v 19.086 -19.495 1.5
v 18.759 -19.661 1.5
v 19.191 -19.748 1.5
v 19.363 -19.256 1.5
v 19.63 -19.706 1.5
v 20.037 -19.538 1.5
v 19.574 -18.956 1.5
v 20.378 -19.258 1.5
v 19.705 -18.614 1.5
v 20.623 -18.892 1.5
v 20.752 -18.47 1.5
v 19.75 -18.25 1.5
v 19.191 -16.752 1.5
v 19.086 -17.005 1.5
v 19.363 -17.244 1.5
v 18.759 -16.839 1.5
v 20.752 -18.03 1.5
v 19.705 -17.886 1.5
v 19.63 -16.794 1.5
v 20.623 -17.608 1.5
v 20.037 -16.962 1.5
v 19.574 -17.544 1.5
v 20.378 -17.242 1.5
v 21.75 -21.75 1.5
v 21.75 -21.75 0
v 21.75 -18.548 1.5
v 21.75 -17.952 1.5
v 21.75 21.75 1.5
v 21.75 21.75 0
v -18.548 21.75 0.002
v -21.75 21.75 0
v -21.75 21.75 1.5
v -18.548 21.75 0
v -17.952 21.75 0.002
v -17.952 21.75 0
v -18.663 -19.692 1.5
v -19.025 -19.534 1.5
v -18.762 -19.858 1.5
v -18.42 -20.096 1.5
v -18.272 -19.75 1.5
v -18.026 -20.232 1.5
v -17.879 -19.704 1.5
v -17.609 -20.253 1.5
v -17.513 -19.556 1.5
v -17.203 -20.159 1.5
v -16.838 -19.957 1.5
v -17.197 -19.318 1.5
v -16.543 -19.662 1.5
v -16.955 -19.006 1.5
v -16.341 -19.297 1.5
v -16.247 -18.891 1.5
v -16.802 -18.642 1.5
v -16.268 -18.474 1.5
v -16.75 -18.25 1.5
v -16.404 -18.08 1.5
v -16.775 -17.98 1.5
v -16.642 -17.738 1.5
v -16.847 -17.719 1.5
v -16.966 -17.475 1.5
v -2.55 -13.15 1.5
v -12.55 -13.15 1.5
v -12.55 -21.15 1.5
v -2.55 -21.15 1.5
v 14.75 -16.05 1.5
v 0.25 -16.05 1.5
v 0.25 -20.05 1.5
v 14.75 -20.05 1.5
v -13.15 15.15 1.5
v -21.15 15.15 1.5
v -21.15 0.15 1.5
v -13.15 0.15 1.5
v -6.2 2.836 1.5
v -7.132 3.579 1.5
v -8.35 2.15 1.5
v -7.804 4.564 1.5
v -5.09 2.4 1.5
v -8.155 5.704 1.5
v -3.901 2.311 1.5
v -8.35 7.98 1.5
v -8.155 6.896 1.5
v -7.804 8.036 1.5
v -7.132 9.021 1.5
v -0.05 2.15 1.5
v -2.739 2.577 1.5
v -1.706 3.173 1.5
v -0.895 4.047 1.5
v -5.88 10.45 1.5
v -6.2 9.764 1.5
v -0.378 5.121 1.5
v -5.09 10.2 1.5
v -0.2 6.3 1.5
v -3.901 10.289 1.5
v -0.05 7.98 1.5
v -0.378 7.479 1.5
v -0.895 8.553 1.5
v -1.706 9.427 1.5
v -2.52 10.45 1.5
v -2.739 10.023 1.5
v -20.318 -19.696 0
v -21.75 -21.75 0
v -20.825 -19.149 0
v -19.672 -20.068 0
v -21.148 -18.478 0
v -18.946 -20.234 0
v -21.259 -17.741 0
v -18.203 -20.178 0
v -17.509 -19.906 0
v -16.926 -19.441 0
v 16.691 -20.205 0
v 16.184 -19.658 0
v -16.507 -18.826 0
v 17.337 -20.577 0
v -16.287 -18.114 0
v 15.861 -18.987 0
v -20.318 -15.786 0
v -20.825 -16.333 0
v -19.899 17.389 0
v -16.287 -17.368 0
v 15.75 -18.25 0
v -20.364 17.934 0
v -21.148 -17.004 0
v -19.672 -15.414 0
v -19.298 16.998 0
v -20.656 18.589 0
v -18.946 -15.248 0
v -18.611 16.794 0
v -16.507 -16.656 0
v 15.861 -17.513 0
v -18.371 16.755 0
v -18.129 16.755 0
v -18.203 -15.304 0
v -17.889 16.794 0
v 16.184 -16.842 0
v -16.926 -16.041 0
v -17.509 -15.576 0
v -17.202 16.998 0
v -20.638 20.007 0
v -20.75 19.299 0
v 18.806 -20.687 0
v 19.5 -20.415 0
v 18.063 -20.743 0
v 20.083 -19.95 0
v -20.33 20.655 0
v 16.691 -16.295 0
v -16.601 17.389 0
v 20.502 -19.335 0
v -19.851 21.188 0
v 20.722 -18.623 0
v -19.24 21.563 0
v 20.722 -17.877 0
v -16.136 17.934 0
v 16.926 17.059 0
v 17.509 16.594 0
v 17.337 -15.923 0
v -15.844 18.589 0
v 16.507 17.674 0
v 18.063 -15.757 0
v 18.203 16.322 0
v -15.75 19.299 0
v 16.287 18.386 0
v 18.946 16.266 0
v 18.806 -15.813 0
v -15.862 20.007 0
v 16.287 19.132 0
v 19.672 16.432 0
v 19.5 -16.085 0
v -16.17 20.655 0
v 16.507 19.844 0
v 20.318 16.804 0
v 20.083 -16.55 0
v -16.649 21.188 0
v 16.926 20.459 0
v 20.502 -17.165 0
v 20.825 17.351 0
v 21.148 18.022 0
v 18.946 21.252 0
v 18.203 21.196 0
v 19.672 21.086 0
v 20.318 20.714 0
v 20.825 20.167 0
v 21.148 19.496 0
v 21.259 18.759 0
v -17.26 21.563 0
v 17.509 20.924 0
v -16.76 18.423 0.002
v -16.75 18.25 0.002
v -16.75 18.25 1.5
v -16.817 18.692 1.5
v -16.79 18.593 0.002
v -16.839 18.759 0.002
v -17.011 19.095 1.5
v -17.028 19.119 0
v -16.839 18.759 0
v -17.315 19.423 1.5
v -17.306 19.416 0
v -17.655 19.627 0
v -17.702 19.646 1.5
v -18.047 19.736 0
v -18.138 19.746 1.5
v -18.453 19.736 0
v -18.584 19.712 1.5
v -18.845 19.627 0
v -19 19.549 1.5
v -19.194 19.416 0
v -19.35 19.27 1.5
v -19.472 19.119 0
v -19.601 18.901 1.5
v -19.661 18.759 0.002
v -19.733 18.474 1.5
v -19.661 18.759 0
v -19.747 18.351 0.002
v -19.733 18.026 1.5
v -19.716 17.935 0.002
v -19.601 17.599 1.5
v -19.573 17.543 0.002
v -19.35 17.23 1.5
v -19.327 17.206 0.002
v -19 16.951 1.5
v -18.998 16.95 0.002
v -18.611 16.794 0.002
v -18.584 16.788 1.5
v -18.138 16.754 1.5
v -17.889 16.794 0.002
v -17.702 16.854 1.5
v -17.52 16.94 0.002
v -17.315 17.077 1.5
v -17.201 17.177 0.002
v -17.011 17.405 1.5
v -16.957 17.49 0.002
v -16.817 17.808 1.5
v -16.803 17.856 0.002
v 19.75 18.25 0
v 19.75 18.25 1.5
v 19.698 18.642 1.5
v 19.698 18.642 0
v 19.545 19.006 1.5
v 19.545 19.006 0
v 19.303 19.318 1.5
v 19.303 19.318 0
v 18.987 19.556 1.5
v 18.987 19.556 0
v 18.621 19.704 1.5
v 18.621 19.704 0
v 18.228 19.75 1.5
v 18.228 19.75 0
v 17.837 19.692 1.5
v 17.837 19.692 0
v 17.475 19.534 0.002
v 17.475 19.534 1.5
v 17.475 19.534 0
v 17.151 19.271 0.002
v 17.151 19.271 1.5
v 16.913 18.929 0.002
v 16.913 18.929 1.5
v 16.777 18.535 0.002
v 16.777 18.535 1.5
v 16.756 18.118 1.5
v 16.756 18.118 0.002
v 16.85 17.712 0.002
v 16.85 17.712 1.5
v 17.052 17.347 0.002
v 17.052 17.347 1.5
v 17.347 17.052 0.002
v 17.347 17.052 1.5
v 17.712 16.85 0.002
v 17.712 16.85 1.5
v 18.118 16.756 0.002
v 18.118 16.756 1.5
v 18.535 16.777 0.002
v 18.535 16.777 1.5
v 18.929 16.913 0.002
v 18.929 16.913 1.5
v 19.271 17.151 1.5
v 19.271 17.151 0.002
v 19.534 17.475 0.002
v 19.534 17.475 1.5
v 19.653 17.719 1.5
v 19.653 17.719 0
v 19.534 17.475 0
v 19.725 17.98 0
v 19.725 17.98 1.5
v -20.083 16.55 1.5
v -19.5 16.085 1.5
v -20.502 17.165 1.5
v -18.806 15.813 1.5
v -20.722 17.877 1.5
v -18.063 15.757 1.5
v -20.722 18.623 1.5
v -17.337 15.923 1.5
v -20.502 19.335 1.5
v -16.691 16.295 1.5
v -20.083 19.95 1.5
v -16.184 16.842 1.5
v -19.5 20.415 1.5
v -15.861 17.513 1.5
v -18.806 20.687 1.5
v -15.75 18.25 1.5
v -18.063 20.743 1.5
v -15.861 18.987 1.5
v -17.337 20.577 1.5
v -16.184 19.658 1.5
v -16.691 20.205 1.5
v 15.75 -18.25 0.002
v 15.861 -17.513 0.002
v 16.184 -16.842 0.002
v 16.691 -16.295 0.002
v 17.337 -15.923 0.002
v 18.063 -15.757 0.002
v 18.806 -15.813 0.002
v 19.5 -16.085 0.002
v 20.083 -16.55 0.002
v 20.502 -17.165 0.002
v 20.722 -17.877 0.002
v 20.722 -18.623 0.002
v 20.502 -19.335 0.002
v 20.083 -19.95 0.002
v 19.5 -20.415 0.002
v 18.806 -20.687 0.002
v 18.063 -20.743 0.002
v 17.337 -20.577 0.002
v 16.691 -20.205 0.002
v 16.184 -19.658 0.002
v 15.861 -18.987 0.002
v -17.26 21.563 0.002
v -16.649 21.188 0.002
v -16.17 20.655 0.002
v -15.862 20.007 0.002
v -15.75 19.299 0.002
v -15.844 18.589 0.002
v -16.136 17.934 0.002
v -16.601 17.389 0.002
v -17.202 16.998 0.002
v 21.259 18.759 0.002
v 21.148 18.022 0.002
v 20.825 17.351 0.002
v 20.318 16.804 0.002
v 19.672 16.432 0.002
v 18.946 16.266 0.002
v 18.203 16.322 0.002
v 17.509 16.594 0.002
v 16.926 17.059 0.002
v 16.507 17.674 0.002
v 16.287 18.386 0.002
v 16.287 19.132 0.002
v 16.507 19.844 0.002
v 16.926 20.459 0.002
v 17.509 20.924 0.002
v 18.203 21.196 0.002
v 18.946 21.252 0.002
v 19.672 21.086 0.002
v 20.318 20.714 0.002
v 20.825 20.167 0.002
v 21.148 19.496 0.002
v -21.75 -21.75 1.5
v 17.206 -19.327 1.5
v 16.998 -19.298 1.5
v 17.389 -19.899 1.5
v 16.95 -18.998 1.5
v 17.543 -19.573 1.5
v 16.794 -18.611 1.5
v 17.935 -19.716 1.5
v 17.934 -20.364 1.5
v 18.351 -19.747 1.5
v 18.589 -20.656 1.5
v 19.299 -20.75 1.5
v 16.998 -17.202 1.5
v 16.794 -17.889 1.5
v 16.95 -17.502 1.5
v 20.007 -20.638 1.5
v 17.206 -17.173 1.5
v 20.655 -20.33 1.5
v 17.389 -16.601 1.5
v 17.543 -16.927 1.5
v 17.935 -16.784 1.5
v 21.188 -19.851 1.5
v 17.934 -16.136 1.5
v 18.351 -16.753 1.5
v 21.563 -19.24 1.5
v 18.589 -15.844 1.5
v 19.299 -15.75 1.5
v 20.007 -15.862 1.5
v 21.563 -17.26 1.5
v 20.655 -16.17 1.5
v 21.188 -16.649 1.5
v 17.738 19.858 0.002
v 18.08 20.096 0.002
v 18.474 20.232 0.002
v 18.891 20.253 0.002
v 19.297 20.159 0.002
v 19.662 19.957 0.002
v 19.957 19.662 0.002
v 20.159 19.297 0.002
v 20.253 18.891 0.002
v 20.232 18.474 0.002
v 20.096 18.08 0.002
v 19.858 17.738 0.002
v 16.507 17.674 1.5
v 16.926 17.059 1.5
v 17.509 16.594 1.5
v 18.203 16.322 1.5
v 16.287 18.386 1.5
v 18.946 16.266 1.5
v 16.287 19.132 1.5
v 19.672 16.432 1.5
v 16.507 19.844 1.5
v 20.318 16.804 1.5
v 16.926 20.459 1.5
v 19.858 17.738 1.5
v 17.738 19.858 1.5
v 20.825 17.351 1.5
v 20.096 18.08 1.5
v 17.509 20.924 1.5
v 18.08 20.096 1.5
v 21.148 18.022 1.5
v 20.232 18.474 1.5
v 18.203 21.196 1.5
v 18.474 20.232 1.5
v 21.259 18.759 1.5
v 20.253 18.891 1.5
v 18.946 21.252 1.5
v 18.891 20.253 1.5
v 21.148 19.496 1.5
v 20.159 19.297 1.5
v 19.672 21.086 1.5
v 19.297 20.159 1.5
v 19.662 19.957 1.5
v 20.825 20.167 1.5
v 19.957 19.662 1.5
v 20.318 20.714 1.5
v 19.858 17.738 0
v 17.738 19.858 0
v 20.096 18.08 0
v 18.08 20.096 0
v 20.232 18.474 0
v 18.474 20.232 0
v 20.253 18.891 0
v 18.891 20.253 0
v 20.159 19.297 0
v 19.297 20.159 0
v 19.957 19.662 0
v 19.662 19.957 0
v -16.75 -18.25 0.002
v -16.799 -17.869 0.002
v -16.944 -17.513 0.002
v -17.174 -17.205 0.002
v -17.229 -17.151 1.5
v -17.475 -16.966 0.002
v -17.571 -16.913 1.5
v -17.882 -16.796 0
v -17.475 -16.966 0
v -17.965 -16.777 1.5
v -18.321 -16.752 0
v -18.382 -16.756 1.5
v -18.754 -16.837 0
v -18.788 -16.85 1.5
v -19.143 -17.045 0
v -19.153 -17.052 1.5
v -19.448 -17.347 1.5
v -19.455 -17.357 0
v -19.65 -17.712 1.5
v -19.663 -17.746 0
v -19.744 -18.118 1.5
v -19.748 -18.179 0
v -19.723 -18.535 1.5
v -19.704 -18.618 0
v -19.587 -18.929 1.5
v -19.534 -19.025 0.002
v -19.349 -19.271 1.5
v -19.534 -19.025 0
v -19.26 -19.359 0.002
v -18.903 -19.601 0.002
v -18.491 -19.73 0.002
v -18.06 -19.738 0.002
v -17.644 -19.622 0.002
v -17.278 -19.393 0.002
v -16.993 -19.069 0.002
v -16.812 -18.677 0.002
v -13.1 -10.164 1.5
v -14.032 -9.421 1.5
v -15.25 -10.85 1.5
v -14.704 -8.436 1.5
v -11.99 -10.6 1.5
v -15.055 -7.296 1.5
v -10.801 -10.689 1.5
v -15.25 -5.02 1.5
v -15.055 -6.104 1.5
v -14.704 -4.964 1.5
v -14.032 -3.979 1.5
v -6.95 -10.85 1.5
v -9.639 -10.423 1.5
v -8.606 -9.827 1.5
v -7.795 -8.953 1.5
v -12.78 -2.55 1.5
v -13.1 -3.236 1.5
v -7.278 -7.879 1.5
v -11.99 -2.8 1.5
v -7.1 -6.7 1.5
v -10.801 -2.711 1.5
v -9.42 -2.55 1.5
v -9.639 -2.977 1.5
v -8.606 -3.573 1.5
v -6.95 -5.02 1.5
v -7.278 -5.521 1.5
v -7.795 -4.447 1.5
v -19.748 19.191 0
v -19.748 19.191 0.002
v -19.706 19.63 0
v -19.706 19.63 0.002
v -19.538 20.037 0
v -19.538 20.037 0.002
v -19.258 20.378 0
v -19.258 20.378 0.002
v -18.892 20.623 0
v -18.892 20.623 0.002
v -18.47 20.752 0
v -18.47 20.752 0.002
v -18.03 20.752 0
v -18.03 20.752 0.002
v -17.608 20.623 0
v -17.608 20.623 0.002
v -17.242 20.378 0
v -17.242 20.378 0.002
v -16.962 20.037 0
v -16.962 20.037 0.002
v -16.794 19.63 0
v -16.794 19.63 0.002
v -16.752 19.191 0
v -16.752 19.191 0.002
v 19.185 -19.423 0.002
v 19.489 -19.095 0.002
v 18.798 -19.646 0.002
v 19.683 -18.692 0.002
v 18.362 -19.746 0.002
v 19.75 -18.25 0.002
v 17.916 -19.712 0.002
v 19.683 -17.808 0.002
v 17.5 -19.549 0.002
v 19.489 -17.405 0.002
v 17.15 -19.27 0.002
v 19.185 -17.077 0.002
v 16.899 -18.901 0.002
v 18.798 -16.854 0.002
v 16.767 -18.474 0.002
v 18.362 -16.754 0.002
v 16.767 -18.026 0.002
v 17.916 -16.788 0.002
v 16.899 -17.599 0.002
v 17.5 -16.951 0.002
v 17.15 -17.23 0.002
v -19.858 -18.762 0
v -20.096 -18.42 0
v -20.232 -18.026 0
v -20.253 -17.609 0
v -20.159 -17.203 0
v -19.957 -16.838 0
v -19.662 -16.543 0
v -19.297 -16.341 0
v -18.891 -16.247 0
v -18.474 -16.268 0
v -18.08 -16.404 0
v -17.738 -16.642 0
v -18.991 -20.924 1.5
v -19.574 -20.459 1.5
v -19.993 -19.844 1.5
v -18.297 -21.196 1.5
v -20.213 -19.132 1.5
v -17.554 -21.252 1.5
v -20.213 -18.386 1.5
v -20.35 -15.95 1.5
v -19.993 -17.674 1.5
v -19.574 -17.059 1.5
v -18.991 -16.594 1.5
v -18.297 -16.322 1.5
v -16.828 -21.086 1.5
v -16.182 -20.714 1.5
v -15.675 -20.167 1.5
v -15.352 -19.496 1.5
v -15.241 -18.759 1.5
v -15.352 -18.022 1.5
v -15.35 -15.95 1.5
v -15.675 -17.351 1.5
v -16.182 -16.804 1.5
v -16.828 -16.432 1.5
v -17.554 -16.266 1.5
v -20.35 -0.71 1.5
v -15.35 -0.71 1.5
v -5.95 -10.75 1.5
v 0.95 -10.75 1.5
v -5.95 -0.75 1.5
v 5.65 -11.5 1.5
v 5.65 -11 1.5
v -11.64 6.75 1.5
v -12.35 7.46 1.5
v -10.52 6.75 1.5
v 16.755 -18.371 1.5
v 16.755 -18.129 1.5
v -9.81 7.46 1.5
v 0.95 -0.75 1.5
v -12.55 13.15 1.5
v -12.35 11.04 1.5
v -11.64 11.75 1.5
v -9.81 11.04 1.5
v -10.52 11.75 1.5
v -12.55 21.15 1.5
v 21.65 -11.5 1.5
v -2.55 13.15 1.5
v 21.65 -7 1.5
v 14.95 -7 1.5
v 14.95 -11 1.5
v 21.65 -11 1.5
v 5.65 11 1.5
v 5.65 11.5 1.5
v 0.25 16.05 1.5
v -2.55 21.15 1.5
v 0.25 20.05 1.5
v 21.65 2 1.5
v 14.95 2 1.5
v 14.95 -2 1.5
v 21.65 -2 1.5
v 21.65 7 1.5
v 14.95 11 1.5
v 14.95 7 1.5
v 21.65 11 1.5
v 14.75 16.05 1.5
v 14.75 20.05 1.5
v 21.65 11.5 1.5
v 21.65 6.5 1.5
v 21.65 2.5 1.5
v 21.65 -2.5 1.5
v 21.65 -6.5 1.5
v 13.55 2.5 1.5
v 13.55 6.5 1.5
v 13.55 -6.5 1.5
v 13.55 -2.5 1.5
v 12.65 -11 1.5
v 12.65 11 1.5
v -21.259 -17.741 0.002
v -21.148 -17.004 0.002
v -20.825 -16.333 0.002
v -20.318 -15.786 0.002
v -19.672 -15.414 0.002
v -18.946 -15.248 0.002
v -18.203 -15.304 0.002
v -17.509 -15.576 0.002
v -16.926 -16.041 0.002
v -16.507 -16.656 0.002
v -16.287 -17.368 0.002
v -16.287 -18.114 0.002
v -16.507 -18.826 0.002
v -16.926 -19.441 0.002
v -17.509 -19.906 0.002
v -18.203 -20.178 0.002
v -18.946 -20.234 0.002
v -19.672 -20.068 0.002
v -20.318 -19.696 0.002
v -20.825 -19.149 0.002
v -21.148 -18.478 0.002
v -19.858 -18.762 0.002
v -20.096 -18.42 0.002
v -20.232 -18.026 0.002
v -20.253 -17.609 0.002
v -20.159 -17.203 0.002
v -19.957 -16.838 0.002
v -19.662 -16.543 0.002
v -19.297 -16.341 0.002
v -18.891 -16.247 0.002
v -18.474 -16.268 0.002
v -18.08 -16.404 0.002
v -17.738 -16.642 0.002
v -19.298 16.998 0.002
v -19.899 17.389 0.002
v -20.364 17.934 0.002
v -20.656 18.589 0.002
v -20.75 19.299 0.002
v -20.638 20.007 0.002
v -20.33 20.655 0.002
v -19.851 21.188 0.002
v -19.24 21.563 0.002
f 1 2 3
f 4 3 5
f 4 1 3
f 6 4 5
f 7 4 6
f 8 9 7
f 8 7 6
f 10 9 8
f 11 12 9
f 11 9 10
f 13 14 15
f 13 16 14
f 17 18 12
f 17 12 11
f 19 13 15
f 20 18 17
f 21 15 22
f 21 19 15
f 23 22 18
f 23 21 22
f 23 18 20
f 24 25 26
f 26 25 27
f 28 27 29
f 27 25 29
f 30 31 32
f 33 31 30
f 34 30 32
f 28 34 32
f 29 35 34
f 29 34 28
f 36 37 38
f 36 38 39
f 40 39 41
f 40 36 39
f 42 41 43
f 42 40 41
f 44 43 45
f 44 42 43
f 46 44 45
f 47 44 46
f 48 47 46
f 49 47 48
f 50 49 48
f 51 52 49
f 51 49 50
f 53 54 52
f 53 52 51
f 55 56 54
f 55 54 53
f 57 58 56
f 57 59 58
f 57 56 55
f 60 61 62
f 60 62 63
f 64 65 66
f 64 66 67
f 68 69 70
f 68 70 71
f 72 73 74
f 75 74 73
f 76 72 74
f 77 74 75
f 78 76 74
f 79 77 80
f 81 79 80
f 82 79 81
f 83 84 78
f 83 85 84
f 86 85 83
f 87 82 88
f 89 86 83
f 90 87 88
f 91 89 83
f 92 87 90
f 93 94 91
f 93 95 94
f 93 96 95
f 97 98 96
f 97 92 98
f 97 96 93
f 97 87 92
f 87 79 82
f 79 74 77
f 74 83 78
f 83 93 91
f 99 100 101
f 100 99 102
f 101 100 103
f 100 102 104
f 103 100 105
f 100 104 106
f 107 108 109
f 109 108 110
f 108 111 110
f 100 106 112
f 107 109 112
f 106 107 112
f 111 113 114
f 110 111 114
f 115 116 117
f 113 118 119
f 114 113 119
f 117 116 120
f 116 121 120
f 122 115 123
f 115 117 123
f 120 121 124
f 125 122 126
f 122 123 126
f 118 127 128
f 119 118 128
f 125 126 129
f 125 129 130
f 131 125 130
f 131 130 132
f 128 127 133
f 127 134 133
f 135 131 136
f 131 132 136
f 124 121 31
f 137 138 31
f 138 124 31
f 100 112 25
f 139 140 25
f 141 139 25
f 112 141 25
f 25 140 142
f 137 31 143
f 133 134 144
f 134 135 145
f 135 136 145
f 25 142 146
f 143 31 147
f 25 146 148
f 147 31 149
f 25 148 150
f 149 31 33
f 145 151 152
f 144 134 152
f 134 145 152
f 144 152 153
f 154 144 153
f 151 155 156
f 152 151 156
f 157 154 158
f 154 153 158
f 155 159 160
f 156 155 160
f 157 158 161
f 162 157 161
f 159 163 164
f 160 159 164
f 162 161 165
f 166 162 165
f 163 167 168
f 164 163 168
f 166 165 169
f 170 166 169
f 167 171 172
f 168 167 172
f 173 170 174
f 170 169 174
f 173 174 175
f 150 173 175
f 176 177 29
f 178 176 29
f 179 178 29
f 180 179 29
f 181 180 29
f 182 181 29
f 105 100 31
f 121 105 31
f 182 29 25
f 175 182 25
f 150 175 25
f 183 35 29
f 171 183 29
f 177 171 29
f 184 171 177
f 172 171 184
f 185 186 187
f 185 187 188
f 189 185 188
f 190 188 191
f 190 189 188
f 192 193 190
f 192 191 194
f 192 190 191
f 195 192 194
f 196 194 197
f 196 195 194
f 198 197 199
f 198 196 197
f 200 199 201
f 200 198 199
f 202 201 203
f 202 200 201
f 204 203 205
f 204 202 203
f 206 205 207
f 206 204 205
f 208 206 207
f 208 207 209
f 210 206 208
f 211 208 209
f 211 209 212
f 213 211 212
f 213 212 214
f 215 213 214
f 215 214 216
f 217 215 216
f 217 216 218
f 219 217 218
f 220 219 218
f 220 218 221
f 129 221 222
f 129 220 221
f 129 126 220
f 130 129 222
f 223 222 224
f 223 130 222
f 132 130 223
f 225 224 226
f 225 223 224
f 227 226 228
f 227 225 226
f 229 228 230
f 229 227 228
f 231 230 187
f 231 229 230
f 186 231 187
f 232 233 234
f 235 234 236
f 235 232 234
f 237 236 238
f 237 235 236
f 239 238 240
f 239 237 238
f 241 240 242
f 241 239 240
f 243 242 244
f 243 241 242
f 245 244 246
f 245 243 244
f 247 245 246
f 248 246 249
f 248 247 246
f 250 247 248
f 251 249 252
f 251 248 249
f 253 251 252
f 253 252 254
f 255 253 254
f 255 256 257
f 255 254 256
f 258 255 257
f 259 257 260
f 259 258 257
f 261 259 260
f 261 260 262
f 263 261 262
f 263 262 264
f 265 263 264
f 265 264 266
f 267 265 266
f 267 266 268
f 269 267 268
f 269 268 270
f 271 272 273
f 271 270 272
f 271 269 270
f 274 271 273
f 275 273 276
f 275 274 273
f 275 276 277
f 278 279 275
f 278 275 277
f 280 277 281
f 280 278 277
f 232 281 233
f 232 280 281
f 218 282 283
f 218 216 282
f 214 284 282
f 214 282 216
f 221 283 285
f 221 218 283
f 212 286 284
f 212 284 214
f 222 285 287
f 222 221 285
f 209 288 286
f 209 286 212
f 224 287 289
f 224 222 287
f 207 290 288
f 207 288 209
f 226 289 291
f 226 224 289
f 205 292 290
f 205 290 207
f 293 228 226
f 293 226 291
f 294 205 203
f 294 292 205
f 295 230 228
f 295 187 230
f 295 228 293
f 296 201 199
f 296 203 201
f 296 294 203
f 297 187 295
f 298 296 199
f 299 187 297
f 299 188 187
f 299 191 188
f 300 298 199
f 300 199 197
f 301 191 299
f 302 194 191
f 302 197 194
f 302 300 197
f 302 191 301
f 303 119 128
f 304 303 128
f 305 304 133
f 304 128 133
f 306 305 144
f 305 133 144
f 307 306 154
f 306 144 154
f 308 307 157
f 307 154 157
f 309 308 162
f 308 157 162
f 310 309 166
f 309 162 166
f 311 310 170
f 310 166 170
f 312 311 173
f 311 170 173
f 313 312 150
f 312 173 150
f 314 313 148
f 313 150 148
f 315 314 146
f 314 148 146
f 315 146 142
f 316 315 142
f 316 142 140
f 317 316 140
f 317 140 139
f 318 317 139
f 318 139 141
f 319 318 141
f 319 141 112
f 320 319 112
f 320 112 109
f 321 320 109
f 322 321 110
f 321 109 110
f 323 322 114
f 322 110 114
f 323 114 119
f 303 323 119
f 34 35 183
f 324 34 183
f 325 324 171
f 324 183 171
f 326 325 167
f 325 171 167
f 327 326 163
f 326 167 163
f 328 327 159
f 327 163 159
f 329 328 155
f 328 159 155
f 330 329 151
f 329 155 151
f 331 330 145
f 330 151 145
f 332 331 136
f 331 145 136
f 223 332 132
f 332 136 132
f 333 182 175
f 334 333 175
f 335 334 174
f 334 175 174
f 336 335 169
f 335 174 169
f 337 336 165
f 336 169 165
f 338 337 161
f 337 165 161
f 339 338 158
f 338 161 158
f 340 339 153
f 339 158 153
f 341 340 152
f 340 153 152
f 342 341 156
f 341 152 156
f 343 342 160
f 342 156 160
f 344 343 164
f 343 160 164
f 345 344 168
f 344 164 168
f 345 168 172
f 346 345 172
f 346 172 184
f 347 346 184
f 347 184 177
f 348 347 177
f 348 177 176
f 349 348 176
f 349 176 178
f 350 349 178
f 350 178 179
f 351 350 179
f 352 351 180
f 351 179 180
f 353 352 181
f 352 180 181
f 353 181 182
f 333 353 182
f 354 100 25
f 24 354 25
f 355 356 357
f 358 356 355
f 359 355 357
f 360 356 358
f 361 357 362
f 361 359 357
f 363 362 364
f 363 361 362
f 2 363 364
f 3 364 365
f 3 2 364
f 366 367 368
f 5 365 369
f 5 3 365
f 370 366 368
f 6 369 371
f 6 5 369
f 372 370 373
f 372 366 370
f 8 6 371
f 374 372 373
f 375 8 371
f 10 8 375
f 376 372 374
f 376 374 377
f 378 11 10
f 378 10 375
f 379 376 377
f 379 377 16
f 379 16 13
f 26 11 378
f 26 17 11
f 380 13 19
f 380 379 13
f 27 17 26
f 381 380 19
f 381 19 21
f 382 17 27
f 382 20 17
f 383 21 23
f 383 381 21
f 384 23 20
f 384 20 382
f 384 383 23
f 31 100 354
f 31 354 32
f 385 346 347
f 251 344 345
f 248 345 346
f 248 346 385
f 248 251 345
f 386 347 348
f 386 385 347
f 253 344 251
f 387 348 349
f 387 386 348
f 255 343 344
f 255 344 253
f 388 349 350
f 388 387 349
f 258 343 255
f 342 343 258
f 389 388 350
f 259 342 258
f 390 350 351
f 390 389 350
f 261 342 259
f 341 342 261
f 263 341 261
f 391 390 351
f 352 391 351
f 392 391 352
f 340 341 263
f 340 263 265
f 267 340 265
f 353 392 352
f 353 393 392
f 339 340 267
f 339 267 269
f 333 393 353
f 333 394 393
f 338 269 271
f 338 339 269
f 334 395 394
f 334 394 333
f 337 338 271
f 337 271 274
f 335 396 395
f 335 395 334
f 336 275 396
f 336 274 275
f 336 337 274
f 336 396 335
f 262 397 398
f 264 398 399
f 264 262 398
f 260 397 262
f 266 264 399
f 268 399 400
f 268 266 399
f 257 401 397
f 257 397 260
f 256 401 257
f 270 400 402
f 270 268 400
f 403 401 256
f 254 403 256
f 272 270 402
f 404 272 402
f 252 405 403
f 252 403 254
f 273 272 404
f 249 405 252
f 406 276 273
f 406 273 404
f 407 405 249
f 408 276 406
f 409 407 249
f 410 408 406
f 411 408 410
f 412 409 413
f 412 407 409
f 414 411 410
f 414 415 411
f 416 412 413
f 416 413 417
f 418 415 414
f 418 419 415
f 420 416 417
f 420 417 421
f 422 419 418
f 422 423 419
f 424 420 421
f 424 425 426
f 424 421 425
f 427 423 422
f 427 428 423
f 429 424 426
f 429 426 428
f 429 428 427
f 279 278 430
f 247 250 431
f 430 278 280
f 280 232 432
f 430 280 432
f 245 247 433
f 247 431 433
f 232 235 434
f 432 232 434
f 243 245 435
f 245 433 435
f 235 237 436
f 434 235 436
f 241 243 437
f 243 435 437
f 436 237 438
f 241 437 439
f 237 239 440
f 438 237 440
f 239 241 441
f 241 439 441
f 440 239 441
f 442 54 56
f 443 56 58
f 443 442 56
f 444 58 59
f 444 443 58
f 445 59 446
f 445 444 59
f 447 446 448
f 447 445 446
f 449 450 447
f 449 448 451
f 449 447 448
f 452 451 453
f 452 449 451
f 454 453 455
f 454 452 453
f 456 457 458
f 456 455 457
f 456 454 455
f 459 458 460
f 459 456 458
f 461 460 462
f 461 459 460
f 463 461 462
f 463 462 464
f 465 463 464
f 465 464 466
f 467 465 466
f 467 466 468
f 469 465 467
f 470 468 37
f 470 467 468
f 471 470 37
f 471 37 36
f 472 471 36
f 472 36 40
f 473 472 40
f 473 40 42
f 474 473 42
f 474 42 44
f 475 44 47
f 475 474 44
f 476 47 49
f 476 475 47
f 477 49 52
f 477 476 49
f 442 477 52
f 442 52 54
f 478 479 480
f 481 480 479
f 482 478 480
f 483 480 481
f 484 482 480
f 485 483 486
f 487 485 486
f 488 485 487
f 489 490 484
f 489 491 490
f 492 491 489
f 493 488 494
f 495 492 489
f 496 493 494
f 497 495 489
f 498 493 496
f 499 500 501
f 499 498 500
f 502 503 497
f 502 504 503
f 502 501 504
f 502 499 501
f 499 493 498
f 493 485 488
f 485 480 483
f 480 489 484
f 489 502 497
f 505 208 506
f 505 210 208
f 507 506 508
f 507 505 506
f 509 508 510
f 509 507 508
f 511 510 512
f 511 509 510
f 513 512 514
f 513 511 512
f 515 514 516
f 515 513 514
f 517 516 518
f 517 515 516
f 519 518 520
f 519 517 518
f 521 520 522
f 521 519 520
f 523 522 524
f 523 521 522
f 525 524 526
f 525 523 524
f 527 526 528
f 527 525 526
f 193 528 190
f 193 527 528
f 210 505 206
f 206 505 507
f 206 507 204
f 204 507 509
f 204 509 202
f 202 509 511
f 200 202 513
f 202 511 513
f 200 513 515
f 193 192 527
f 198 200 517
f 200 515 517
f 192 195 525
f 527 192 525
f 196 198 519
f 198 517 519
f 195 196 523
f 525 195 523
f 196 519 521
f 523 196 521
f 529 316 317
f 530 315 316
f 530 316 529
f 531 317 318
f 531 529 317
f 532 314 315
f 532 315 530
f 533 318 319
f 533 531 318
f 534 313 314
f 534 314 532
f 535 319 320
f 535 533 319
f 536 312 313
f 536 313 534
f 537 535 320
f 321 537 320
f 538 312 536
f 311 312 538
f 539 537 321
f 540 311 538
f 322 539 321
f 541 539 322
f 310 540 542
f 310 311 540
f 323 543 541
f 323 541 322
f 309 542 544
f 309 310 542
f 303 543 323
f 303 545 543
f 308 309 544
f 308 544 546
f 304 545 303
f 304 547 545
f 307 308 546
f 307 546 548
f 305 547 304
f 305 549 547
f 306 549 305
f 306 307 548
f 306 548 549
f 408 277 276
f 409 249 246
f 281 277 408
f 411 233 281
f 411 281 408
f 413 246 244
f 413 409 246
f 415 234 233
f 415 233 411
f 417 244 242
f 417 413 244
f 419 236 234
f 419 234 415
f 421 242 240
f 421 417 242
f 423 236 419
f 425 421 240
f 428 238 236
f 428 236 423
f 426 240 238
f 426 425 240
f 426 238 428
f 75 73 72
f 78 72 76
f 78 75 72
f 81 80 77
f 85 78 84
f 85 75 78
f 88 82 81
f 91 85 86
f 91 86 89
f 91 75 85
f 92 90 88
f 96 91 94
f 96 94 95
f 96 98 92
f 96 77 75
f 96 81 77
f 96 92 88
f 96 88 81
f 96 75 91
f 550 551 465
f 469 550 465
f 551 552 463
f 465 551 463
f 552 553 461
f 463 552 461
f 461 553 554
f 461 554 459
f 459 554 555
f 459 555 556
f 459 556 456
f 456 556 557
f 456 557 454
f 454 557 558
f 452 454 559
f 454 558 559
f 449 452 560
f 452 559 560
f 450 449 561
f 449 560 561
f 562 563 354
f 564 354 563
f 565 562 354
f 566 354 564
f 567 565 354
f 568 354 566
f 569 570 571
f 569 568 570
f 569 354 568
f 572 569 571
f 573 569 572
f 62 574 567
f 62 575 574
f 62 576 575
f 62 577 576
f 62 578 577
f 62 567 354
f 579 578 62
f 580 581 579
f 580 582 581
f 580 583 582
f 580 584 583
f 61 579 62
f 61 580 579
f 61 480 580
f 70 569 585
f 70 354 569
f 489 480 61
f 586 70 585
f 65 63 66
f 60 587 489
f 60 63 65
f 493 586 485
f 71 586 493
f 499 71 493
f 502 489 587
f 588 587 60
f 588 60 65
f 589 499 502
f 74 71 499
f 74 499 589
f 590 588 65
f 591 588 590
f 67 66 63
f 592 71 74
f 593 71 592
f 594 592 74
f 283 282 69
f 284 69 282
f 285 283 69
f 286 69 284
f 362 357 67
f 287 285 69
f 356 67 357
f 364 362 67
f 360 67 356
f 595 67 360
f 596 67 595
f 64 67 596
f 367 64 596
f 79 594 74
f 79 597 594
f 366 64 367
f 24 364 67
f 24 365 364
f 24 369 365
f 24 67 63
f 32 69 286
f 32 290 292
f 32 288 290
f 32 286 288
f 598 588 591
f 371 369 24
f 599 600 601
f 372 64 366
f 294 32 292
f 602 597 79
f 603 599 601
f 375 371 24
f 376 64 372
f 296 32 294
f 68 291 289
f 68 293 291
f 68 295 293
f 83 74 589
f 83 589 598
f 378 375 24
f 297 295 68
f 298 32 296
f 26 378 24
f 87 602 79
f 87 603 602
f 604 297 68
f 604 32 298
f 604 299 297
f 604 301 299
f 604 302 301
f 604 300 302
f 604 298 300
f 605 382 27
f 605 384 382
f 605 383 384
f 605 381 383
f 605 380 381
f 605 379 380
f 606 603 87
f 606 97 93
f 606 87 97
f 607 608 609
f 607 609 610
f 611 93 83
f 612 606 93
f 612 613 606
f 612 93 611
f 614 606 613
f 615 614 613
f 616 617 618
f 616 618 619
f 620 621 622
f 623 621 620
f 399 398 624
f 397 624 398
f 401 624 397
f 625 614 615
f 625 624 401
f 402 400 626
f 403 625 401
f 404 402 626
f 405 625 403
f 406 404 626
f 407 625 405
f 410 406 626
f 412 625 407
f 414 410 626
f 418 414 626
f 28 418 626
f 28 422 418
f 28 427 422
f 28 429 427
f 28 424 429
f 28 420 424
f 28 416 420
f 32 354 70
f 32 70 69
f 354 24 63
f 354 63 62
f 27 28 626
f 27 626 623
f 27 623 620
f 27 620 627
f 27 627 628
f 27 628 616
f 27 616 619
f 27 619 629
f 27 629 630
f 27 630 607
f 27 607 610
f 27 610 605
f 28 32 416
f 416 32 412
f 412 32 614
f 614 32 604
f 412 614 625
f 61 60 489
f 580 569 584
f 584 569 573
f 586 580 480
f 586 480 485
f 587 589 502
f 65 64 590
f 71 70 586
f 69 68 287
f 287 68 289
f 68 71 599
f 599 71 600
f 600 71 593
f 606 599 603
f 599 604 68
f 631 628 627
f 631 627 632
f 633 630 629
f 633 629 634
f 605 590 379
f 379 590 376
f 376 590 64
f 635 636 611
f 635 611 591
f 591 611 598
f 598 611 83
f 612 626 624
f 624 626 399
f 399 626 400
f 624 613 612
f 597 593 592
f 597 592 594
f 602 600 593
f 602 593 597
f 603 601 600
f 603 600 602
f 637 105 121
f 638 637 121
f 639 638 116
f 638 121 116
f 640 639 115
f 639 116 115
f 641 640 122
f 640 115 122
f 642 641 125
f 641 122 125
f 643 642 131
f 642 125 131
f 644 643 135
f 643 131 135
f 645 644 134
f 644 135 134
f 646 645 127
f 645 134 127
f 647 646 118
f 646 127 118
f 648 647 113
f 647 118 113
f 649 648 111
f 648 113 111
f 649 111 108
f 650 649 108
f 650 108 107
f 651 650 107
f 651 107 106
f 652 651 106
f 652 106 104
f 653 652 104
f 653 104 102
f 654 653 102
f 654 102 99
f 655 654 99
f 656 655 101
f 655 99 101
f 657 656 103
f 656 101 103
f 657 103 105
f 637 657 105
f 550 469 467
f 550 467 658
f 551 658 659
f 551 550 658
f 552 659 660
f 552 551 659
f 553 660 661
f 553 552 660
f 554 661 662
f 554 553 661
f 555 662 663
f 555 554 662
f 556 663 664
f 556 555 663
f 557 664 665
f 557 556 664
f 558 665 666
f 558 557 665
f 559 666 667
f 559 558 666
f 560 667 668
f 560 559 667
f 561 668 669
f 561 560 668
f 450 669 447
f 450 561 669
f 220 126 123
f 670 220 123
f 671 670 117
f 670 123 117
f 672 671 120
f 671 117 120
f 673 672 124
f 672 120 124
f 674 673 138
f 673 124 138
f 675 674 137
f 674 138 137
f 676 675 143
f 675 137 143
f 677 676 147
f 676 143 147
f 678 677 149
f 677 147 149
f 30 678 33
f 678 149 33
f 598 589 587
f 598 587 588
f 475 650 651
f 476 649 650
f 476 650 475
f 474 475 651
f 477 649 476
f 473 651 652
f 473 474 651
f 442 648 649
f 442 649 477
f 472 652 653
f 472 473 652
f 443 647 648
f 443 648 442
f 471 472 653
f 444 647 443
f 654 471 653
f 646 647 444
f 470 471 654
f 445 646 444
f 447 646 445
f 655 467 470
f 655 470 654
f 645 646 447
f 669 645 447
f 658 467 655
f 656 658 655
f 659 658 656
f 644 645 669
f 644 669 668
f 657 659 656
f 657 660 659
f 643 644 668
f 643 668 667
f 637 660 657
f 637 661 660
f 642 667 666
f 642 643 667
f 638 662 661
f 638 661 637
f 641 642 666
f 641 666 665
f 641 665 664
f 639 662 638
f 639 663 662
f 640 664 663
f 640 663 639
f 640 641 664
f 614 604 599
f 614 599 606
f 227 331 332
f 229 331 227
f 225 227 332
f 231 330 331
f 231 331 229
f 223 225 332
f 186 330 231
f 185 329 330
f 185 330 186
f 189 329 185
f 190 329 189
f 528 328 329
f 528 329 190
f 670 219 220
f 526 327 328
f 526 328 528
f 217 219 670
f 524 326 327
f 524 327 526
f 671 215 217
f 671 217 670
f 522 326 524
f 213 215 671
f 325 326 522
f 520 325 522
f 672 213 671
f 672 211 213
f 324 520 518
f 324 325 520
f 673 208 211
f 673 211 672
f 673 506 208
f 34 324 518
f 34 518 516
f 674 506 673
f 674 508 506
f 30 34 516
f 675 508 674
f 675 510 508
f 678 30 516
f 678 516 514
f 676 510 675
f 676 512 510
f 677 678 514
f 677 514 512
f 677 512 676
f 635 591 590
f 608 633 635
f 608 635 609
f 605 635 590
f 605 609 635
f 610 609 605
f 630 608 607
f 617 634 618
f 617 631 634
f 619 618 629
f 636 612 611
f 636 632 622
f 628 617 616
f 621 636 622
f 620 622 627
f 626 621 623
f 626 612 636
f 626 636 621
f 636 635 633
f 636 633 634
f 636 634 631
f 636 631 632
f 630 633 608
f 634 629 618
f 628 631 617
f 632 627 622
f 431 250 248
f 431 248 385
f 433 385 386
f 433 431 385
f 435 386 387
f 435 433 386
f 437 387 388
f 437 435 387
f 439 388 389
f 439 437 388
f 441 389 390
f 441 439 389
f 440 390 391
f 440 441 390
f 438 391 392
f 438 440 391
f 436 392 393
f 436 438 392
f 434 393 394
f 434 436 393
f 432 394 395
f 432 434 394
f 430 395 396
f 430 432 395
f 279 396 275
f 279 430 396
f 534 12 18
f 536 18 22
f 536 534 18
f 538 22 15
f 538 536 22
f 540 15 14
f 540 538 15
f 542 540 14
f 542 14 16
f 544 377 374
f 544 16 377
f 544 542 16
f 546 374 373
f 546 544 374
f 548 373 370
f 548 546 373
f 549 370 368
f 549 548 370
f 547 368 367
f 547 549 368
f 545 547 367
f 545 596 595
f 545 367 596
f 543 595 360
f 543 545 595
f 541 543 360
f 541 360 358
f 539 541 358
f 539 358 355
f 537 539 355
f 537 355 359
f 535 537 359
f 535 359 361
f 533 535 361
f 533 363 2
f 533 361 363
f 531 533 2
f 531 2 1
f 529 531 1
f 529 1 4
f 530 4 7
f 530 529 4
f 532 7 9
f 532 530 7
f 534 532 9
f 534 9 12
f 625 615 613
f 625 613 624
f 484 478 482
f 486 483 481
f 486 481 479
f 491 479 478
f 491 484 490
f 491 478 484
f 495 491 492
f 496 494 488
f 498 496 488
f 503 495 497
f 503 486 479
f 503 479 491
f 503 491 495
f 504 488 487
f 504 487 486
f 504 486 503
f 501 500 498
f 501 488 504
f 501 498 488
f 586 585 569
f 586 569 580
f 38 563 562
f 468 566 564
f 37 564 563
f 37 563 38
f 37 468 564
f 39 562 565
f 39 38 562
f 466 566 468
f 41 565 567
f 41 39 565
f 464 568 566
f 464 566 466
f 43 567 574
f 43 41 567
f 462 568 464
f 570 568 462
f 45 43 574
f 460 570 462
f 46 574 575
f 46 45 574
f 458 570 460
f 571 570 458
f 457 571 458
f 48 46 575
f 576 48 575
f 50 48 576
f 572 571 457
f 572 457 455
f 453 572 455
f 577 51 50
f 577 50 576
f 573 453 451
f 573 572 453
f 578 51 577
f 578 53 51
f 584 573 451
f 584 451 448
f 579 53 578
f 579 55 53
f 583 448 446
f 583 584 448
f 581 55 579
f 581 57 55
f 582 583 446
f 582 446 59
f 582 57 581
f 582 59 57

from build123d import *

# Parameters (mm, degrees)
SKETCH1_W           = 43.5
SKETCH1_H           = 43.5
SKETCH1_R           = 1.5
BOSS_EXTRUDE1_DEPTH = 1.5
CUT_EXTRUDE1_START  = -0.0001
SKETCH2_R           = 2.5
SKETCH2_R_2         = 1.5
CUT_EXTRUDE1_DEPTH  = 0.0001
SKETCH3_R           = 2.5
SKETCH3_R_2         = 1.5
CUT_EXTRUDE2_DEPTH  = 0.002
SKETCH4_W           = 7
SKETCH4_H           = 0.5
CUT_EXTRUDE4_DEPTH  = 0.0001
SKETCH6_W           = 8
SKETCH6_H           = 15
SKETCH6_W_2         = 10
SKETCH6_H_2         = 8
CUT_EXTRUDE5_DEPTH  = 0.0001
SKETCH8_R           = 4
CUT_EXTRUDE6_DEPTH  = 0.0001
SKETCH9_W           = 14.5
SKETCH9_H           = 4
CUT_EXTRUDE7_DEPTH  = 0.0001
SKETCH10_W          = 5
SKETCH10_H          = 15.24
CUT_EXTRUDE8_DEPTH  = 0.0001
SKETCH11_R          = 4
SKETCH11_W          = 14.5
SKETCH11_H          = 4
CUT_EXTRUDE9_DEPTH  = 0.0001
CUT_EXTRUDE10_DEPTH = 0.0001
SKETCH13_W          = 6.9
SKETCH13_H          = 10
CUT_EXTRUDE11_DEPTH = 0.0001


with BuildPart() as part:
    # Sketch1 → Boss-Extrude1 (new body)
    with BuildSketch(Plane.XY):
        Rectangle(SKETCH1_W, SKETCH1_H)
        with Locations((-18.25, 18.25)):
            Circle(SKETCH1_R, mode=Mode.SUBTRACT)
        with Locations((18.25, 18.25)):
            Circle(SKETCH1_R, mode=Mode.SUBTRACT)
        with Locations((18.25, -18.25)):
            Circle(SKETCH1_R, mode=Mode.SUBTRACT)
        with Locations((-18.25, -18.25)):
            Circle(SKETCH1_R, mode=Mode.SUBTRACT)
    extrude(amount=BOSS_EXTRUDE1_DEPTH)

    # Sketch2 → Cut-Extrude1 (cut)
    # profile 1 of 4: a face of its own
    with BuildSketch(Plane.XY.offset(1.5).offset(CUT_EXTRUDE1_START)):
        with Locations((-18.25, 18.25)):
            Circle(SKETCH2_R)
        with Locations((-18.25, 18.25)):
            Circle(SKETCH2_R_2, mode=Mode.SUBTRACT)
    # profile 2 of 4: a face of its own
    with BuildSketch(Plane.XY.offset(1.5).offset(CUT_EXTRUDE1_START)):
        with Locations((18.758938316, 18.758938316)):
            Circle(SKETCH2_R)
        with Locations((18.758938316, 18.758938316)):
            Circle(SKETCH2_R_2, mode=Mode.SUBTRACT)
    # profile 3 of 4: a face of its own
    with BuildSketch(Plane.XY.offset(1.5).offset(CUT_EXTRUDE1_START)):
        with Locations((19.267876631, -18.25)):
            Circle(SKETCH2_R)
        with Locations((19.267876631, -18.25)):
            Circle(SKETCH2_R_2, mode=Mode.SUBTRACT)
    # profile 4 of 4: a face of its own
    with BuildSketch(Plane.XY.offset(1.5).offset(CUT_EXTRUDE1_START)):
        with Locations((-17.741061684, -18.758938316)):
            Circle(SKETCH2_R)
        with Locations((-17.741061684, -18.758938316)):
            Circle(SKETCH2_R_2, mode=Mode.SUBTRACT)
    extrude(amount=CUT_EXTRUDE1_DEPTH, mode=Mode.SUBTRACT)

    # Sketch3 → Cut-Extrude2 (cut)
    # profile 1 of 4: a face of its own
    with BuildSketch(Plane(origin=(0, 0, 0), x_dir=(-1, 0, 0), z_dir=(0, 0, -1))):
        with Locations((-18.25, -18.25)):
            Circle(SKETCH3_R)
        with Locations((-18.25, -18.25)):
            Circle(SKETCH3_R_2, mode=Mode.SUBTRACT)
    # profile 2 of 4: a face of its own
    with BuildSketch(Plane(origin=(0, 0, 0), x_dir=(-1, 0, 0), z_dir=(0, 0, -1))):
        with Locations(Location((-18.758938316, 18.758938316, 0), (0, 0, 180))):
            Circle(SKETCH3_R)
        with Locations((-18.758938316, 18.758938316)):
            Circle(SKETCH3_R_2, mode=Mode.SUBTRACT)
    # profile 3 of 4: a face of its own
    with BuildSketch(Plane(origin=(0, 0, 0), x_dir=(-1, 0, 0), z_dir=(0, 0, -1))):
        with Locations((18.25, 19.267876631)):
            Circle(SKETCH3_R)
        with Locations((18.25, 19.267876631)):
            Circle(SKETCH3_R_2, mode=Mode.SUBTRACT)
    # profile 4 of 4: a face of its own
    with BuildSketch(Plane(origin=(0, 0, 0), x_dir=(-1, 0, 0), z_dir=(0, 0, -1))):
        with Locations((18.758938316, -17.741061684)):
            Circle(SKETCH3_R)
        with Locations((18.758938316, -17.741061684)):
            Circle(SKETCH3_R_2, mode=Mode.SUBTRACT)
    extrude(amount=-CUT_EXTRUDE2_DEPTH, mode=Mode.SUBTRACT)

    # Sketch4 → Cut-Extrude4 (cut)
    with BuildSketch(Plane.XY.offset(1.5)):
        Polygon((14.95, 11), (21.65, 11), (21.65, 11.5), (12.65, 11.5), (12.65, 11), (12.65, -11), (12.65, -11.5), (21.65, -11.5), (21.65, -11), (14.95, -11), (14.95, -7), (21.65, -7), (21.65, -6.5), (13.55, -6.5), (13.55, -2.5), (21.65, -2.5), (21.65, -2), (14.95, -2), (14.95, 2), (21.65, 2), (21.65, 2.5), (13.55, 2.5), (13.55, 6.5), (21.65, 6.5), (21.65, 7), (14.95, 7), align=None)
        with Locations((9.15, 11.25)):
            Rectangle(SKETCH4_W, SKETCH4_H)
        with Locations((9.15, -11.25)):
            Rectangle(SKETCH4_W, SKETCH4_H)
    extrude(amount=-CUT_EXTRUDE4_DEPTH, mode=Mode.SUBTRACT)

    # Sketch6 → Cut-Extrude5 (cut)
    with BuildSketch(Plane.XY.offset(1.5)):
        with Locations((-17.15, 7.65)):
            Rectangle(SKETCH6_W, SKETCH6_H)
        with Locations((-7.55, 17.15)):
            Rectangle(SKETCH6_W_2, SKETCH6_H_2)
        with Locations((-7.55, -17.15)):
            Rectangle(SKETCH6_W_2, SKETCH6_H_2)
    extrude(amount=-CUT_EXTRUDE5_DEPTH, mode=Mode.SUBTRACT)

    # Sketch8 → Cut-Extrude6 (cut)
    with BuildSketch(Plane.XY.offset(1.5)):
        Polygon((-0.05, 7.98), (-2.52, 10.45), (-5.88, 10.45), (-8.35, 7.98), (-8.35, 2.15), (-0.05, 2.15), align=None)
        with Locations((-4.2, 6.3)):
            Circle(SKETCH8_R, mode=Mode.SUBTRACT)
    extrude(amount=-CUT_EXTRUDE6_DEPTH, mode=Mode.SUBTRACT)

    # Sketch9 → Cut-Extrude7 (cut)
    with BuildSketch(Plane.XY.offset(1.5)):
        with Locations((7.5, 18.05)):
            Rectangle(SKETCH9_W, SKETCH9_H)
    extrude(amount=-CUT_EXTRUDE7_DEPTH, mode=Mode.SUBTRACT)

    # Sketch10 → Cut-Extrude8 (cut)
    with BuildSketch(Plane.XY.offset(1.5)):
        with Locations((-17.85, -8.33)):
            Rectangle(SKETCH10_W, SKETCH10_H)
    extrude(amount=-CUT_EXTRUDE8_DEPTH, mode=Mode.SUBTRACT)

    # Sketch11 → Cut-Extrude9 (cut)
    # profile 1 of 2: a face of its own
    with BuildSketch(Plane.XY.offset(1.5)):
        Polygon((-9.42, -2.55), (-12.78, -2.55), (-15.25, -5.02), (-15.25, -10.85), (-6.95, -10.85), (-6.95, -5.02), align=None)
        with Locations((-11.1, -6.7)):
            Circle(SKETCH11_R, mode=Mode.SUBTRACT)
    # profile 2 of 2: a face of its own
    with BuildSketch(Plane.XY.offset(1.5)):
        with Locations((7.5, -18.05)):
            Rectangle(SKETCH11_W, SKETCH11_H)
    extrude(amount=-CUT_EXTRUDE9_DEPTH, mode=Mode.SUBTRACT)

    # Sketch12 → Cut-Extrude10 (cut)
    with BuildSketch(Plane.XY.offset(1.5)):
        Polygon((-9.81, 11.04), (-10.52, 11.75), (-11.64, 11.75), (-12.35, 11.04), (-12.35, 7.46), (-11.64, 6.75), (-10.52, 6.75), (-9.81, 7.46), align=None)
    extrude(amount=-CUT_EXTRUDE10_DEPTH, mode=Mode.SUBTRACT)

    # Sketch13 → Cut-Extrude11 (cut)
    with BuildSketch(Plane.XY.offset(1.5)):
        with Locations((-2.5, -5.75)):
            Rectangle(SKETCH13_W, SKETCH13_H)
    extrude(amount=-CUT_EXTRUDE11_DEPTH, mode=Mode.SUBTRACT)


solid = part.part
